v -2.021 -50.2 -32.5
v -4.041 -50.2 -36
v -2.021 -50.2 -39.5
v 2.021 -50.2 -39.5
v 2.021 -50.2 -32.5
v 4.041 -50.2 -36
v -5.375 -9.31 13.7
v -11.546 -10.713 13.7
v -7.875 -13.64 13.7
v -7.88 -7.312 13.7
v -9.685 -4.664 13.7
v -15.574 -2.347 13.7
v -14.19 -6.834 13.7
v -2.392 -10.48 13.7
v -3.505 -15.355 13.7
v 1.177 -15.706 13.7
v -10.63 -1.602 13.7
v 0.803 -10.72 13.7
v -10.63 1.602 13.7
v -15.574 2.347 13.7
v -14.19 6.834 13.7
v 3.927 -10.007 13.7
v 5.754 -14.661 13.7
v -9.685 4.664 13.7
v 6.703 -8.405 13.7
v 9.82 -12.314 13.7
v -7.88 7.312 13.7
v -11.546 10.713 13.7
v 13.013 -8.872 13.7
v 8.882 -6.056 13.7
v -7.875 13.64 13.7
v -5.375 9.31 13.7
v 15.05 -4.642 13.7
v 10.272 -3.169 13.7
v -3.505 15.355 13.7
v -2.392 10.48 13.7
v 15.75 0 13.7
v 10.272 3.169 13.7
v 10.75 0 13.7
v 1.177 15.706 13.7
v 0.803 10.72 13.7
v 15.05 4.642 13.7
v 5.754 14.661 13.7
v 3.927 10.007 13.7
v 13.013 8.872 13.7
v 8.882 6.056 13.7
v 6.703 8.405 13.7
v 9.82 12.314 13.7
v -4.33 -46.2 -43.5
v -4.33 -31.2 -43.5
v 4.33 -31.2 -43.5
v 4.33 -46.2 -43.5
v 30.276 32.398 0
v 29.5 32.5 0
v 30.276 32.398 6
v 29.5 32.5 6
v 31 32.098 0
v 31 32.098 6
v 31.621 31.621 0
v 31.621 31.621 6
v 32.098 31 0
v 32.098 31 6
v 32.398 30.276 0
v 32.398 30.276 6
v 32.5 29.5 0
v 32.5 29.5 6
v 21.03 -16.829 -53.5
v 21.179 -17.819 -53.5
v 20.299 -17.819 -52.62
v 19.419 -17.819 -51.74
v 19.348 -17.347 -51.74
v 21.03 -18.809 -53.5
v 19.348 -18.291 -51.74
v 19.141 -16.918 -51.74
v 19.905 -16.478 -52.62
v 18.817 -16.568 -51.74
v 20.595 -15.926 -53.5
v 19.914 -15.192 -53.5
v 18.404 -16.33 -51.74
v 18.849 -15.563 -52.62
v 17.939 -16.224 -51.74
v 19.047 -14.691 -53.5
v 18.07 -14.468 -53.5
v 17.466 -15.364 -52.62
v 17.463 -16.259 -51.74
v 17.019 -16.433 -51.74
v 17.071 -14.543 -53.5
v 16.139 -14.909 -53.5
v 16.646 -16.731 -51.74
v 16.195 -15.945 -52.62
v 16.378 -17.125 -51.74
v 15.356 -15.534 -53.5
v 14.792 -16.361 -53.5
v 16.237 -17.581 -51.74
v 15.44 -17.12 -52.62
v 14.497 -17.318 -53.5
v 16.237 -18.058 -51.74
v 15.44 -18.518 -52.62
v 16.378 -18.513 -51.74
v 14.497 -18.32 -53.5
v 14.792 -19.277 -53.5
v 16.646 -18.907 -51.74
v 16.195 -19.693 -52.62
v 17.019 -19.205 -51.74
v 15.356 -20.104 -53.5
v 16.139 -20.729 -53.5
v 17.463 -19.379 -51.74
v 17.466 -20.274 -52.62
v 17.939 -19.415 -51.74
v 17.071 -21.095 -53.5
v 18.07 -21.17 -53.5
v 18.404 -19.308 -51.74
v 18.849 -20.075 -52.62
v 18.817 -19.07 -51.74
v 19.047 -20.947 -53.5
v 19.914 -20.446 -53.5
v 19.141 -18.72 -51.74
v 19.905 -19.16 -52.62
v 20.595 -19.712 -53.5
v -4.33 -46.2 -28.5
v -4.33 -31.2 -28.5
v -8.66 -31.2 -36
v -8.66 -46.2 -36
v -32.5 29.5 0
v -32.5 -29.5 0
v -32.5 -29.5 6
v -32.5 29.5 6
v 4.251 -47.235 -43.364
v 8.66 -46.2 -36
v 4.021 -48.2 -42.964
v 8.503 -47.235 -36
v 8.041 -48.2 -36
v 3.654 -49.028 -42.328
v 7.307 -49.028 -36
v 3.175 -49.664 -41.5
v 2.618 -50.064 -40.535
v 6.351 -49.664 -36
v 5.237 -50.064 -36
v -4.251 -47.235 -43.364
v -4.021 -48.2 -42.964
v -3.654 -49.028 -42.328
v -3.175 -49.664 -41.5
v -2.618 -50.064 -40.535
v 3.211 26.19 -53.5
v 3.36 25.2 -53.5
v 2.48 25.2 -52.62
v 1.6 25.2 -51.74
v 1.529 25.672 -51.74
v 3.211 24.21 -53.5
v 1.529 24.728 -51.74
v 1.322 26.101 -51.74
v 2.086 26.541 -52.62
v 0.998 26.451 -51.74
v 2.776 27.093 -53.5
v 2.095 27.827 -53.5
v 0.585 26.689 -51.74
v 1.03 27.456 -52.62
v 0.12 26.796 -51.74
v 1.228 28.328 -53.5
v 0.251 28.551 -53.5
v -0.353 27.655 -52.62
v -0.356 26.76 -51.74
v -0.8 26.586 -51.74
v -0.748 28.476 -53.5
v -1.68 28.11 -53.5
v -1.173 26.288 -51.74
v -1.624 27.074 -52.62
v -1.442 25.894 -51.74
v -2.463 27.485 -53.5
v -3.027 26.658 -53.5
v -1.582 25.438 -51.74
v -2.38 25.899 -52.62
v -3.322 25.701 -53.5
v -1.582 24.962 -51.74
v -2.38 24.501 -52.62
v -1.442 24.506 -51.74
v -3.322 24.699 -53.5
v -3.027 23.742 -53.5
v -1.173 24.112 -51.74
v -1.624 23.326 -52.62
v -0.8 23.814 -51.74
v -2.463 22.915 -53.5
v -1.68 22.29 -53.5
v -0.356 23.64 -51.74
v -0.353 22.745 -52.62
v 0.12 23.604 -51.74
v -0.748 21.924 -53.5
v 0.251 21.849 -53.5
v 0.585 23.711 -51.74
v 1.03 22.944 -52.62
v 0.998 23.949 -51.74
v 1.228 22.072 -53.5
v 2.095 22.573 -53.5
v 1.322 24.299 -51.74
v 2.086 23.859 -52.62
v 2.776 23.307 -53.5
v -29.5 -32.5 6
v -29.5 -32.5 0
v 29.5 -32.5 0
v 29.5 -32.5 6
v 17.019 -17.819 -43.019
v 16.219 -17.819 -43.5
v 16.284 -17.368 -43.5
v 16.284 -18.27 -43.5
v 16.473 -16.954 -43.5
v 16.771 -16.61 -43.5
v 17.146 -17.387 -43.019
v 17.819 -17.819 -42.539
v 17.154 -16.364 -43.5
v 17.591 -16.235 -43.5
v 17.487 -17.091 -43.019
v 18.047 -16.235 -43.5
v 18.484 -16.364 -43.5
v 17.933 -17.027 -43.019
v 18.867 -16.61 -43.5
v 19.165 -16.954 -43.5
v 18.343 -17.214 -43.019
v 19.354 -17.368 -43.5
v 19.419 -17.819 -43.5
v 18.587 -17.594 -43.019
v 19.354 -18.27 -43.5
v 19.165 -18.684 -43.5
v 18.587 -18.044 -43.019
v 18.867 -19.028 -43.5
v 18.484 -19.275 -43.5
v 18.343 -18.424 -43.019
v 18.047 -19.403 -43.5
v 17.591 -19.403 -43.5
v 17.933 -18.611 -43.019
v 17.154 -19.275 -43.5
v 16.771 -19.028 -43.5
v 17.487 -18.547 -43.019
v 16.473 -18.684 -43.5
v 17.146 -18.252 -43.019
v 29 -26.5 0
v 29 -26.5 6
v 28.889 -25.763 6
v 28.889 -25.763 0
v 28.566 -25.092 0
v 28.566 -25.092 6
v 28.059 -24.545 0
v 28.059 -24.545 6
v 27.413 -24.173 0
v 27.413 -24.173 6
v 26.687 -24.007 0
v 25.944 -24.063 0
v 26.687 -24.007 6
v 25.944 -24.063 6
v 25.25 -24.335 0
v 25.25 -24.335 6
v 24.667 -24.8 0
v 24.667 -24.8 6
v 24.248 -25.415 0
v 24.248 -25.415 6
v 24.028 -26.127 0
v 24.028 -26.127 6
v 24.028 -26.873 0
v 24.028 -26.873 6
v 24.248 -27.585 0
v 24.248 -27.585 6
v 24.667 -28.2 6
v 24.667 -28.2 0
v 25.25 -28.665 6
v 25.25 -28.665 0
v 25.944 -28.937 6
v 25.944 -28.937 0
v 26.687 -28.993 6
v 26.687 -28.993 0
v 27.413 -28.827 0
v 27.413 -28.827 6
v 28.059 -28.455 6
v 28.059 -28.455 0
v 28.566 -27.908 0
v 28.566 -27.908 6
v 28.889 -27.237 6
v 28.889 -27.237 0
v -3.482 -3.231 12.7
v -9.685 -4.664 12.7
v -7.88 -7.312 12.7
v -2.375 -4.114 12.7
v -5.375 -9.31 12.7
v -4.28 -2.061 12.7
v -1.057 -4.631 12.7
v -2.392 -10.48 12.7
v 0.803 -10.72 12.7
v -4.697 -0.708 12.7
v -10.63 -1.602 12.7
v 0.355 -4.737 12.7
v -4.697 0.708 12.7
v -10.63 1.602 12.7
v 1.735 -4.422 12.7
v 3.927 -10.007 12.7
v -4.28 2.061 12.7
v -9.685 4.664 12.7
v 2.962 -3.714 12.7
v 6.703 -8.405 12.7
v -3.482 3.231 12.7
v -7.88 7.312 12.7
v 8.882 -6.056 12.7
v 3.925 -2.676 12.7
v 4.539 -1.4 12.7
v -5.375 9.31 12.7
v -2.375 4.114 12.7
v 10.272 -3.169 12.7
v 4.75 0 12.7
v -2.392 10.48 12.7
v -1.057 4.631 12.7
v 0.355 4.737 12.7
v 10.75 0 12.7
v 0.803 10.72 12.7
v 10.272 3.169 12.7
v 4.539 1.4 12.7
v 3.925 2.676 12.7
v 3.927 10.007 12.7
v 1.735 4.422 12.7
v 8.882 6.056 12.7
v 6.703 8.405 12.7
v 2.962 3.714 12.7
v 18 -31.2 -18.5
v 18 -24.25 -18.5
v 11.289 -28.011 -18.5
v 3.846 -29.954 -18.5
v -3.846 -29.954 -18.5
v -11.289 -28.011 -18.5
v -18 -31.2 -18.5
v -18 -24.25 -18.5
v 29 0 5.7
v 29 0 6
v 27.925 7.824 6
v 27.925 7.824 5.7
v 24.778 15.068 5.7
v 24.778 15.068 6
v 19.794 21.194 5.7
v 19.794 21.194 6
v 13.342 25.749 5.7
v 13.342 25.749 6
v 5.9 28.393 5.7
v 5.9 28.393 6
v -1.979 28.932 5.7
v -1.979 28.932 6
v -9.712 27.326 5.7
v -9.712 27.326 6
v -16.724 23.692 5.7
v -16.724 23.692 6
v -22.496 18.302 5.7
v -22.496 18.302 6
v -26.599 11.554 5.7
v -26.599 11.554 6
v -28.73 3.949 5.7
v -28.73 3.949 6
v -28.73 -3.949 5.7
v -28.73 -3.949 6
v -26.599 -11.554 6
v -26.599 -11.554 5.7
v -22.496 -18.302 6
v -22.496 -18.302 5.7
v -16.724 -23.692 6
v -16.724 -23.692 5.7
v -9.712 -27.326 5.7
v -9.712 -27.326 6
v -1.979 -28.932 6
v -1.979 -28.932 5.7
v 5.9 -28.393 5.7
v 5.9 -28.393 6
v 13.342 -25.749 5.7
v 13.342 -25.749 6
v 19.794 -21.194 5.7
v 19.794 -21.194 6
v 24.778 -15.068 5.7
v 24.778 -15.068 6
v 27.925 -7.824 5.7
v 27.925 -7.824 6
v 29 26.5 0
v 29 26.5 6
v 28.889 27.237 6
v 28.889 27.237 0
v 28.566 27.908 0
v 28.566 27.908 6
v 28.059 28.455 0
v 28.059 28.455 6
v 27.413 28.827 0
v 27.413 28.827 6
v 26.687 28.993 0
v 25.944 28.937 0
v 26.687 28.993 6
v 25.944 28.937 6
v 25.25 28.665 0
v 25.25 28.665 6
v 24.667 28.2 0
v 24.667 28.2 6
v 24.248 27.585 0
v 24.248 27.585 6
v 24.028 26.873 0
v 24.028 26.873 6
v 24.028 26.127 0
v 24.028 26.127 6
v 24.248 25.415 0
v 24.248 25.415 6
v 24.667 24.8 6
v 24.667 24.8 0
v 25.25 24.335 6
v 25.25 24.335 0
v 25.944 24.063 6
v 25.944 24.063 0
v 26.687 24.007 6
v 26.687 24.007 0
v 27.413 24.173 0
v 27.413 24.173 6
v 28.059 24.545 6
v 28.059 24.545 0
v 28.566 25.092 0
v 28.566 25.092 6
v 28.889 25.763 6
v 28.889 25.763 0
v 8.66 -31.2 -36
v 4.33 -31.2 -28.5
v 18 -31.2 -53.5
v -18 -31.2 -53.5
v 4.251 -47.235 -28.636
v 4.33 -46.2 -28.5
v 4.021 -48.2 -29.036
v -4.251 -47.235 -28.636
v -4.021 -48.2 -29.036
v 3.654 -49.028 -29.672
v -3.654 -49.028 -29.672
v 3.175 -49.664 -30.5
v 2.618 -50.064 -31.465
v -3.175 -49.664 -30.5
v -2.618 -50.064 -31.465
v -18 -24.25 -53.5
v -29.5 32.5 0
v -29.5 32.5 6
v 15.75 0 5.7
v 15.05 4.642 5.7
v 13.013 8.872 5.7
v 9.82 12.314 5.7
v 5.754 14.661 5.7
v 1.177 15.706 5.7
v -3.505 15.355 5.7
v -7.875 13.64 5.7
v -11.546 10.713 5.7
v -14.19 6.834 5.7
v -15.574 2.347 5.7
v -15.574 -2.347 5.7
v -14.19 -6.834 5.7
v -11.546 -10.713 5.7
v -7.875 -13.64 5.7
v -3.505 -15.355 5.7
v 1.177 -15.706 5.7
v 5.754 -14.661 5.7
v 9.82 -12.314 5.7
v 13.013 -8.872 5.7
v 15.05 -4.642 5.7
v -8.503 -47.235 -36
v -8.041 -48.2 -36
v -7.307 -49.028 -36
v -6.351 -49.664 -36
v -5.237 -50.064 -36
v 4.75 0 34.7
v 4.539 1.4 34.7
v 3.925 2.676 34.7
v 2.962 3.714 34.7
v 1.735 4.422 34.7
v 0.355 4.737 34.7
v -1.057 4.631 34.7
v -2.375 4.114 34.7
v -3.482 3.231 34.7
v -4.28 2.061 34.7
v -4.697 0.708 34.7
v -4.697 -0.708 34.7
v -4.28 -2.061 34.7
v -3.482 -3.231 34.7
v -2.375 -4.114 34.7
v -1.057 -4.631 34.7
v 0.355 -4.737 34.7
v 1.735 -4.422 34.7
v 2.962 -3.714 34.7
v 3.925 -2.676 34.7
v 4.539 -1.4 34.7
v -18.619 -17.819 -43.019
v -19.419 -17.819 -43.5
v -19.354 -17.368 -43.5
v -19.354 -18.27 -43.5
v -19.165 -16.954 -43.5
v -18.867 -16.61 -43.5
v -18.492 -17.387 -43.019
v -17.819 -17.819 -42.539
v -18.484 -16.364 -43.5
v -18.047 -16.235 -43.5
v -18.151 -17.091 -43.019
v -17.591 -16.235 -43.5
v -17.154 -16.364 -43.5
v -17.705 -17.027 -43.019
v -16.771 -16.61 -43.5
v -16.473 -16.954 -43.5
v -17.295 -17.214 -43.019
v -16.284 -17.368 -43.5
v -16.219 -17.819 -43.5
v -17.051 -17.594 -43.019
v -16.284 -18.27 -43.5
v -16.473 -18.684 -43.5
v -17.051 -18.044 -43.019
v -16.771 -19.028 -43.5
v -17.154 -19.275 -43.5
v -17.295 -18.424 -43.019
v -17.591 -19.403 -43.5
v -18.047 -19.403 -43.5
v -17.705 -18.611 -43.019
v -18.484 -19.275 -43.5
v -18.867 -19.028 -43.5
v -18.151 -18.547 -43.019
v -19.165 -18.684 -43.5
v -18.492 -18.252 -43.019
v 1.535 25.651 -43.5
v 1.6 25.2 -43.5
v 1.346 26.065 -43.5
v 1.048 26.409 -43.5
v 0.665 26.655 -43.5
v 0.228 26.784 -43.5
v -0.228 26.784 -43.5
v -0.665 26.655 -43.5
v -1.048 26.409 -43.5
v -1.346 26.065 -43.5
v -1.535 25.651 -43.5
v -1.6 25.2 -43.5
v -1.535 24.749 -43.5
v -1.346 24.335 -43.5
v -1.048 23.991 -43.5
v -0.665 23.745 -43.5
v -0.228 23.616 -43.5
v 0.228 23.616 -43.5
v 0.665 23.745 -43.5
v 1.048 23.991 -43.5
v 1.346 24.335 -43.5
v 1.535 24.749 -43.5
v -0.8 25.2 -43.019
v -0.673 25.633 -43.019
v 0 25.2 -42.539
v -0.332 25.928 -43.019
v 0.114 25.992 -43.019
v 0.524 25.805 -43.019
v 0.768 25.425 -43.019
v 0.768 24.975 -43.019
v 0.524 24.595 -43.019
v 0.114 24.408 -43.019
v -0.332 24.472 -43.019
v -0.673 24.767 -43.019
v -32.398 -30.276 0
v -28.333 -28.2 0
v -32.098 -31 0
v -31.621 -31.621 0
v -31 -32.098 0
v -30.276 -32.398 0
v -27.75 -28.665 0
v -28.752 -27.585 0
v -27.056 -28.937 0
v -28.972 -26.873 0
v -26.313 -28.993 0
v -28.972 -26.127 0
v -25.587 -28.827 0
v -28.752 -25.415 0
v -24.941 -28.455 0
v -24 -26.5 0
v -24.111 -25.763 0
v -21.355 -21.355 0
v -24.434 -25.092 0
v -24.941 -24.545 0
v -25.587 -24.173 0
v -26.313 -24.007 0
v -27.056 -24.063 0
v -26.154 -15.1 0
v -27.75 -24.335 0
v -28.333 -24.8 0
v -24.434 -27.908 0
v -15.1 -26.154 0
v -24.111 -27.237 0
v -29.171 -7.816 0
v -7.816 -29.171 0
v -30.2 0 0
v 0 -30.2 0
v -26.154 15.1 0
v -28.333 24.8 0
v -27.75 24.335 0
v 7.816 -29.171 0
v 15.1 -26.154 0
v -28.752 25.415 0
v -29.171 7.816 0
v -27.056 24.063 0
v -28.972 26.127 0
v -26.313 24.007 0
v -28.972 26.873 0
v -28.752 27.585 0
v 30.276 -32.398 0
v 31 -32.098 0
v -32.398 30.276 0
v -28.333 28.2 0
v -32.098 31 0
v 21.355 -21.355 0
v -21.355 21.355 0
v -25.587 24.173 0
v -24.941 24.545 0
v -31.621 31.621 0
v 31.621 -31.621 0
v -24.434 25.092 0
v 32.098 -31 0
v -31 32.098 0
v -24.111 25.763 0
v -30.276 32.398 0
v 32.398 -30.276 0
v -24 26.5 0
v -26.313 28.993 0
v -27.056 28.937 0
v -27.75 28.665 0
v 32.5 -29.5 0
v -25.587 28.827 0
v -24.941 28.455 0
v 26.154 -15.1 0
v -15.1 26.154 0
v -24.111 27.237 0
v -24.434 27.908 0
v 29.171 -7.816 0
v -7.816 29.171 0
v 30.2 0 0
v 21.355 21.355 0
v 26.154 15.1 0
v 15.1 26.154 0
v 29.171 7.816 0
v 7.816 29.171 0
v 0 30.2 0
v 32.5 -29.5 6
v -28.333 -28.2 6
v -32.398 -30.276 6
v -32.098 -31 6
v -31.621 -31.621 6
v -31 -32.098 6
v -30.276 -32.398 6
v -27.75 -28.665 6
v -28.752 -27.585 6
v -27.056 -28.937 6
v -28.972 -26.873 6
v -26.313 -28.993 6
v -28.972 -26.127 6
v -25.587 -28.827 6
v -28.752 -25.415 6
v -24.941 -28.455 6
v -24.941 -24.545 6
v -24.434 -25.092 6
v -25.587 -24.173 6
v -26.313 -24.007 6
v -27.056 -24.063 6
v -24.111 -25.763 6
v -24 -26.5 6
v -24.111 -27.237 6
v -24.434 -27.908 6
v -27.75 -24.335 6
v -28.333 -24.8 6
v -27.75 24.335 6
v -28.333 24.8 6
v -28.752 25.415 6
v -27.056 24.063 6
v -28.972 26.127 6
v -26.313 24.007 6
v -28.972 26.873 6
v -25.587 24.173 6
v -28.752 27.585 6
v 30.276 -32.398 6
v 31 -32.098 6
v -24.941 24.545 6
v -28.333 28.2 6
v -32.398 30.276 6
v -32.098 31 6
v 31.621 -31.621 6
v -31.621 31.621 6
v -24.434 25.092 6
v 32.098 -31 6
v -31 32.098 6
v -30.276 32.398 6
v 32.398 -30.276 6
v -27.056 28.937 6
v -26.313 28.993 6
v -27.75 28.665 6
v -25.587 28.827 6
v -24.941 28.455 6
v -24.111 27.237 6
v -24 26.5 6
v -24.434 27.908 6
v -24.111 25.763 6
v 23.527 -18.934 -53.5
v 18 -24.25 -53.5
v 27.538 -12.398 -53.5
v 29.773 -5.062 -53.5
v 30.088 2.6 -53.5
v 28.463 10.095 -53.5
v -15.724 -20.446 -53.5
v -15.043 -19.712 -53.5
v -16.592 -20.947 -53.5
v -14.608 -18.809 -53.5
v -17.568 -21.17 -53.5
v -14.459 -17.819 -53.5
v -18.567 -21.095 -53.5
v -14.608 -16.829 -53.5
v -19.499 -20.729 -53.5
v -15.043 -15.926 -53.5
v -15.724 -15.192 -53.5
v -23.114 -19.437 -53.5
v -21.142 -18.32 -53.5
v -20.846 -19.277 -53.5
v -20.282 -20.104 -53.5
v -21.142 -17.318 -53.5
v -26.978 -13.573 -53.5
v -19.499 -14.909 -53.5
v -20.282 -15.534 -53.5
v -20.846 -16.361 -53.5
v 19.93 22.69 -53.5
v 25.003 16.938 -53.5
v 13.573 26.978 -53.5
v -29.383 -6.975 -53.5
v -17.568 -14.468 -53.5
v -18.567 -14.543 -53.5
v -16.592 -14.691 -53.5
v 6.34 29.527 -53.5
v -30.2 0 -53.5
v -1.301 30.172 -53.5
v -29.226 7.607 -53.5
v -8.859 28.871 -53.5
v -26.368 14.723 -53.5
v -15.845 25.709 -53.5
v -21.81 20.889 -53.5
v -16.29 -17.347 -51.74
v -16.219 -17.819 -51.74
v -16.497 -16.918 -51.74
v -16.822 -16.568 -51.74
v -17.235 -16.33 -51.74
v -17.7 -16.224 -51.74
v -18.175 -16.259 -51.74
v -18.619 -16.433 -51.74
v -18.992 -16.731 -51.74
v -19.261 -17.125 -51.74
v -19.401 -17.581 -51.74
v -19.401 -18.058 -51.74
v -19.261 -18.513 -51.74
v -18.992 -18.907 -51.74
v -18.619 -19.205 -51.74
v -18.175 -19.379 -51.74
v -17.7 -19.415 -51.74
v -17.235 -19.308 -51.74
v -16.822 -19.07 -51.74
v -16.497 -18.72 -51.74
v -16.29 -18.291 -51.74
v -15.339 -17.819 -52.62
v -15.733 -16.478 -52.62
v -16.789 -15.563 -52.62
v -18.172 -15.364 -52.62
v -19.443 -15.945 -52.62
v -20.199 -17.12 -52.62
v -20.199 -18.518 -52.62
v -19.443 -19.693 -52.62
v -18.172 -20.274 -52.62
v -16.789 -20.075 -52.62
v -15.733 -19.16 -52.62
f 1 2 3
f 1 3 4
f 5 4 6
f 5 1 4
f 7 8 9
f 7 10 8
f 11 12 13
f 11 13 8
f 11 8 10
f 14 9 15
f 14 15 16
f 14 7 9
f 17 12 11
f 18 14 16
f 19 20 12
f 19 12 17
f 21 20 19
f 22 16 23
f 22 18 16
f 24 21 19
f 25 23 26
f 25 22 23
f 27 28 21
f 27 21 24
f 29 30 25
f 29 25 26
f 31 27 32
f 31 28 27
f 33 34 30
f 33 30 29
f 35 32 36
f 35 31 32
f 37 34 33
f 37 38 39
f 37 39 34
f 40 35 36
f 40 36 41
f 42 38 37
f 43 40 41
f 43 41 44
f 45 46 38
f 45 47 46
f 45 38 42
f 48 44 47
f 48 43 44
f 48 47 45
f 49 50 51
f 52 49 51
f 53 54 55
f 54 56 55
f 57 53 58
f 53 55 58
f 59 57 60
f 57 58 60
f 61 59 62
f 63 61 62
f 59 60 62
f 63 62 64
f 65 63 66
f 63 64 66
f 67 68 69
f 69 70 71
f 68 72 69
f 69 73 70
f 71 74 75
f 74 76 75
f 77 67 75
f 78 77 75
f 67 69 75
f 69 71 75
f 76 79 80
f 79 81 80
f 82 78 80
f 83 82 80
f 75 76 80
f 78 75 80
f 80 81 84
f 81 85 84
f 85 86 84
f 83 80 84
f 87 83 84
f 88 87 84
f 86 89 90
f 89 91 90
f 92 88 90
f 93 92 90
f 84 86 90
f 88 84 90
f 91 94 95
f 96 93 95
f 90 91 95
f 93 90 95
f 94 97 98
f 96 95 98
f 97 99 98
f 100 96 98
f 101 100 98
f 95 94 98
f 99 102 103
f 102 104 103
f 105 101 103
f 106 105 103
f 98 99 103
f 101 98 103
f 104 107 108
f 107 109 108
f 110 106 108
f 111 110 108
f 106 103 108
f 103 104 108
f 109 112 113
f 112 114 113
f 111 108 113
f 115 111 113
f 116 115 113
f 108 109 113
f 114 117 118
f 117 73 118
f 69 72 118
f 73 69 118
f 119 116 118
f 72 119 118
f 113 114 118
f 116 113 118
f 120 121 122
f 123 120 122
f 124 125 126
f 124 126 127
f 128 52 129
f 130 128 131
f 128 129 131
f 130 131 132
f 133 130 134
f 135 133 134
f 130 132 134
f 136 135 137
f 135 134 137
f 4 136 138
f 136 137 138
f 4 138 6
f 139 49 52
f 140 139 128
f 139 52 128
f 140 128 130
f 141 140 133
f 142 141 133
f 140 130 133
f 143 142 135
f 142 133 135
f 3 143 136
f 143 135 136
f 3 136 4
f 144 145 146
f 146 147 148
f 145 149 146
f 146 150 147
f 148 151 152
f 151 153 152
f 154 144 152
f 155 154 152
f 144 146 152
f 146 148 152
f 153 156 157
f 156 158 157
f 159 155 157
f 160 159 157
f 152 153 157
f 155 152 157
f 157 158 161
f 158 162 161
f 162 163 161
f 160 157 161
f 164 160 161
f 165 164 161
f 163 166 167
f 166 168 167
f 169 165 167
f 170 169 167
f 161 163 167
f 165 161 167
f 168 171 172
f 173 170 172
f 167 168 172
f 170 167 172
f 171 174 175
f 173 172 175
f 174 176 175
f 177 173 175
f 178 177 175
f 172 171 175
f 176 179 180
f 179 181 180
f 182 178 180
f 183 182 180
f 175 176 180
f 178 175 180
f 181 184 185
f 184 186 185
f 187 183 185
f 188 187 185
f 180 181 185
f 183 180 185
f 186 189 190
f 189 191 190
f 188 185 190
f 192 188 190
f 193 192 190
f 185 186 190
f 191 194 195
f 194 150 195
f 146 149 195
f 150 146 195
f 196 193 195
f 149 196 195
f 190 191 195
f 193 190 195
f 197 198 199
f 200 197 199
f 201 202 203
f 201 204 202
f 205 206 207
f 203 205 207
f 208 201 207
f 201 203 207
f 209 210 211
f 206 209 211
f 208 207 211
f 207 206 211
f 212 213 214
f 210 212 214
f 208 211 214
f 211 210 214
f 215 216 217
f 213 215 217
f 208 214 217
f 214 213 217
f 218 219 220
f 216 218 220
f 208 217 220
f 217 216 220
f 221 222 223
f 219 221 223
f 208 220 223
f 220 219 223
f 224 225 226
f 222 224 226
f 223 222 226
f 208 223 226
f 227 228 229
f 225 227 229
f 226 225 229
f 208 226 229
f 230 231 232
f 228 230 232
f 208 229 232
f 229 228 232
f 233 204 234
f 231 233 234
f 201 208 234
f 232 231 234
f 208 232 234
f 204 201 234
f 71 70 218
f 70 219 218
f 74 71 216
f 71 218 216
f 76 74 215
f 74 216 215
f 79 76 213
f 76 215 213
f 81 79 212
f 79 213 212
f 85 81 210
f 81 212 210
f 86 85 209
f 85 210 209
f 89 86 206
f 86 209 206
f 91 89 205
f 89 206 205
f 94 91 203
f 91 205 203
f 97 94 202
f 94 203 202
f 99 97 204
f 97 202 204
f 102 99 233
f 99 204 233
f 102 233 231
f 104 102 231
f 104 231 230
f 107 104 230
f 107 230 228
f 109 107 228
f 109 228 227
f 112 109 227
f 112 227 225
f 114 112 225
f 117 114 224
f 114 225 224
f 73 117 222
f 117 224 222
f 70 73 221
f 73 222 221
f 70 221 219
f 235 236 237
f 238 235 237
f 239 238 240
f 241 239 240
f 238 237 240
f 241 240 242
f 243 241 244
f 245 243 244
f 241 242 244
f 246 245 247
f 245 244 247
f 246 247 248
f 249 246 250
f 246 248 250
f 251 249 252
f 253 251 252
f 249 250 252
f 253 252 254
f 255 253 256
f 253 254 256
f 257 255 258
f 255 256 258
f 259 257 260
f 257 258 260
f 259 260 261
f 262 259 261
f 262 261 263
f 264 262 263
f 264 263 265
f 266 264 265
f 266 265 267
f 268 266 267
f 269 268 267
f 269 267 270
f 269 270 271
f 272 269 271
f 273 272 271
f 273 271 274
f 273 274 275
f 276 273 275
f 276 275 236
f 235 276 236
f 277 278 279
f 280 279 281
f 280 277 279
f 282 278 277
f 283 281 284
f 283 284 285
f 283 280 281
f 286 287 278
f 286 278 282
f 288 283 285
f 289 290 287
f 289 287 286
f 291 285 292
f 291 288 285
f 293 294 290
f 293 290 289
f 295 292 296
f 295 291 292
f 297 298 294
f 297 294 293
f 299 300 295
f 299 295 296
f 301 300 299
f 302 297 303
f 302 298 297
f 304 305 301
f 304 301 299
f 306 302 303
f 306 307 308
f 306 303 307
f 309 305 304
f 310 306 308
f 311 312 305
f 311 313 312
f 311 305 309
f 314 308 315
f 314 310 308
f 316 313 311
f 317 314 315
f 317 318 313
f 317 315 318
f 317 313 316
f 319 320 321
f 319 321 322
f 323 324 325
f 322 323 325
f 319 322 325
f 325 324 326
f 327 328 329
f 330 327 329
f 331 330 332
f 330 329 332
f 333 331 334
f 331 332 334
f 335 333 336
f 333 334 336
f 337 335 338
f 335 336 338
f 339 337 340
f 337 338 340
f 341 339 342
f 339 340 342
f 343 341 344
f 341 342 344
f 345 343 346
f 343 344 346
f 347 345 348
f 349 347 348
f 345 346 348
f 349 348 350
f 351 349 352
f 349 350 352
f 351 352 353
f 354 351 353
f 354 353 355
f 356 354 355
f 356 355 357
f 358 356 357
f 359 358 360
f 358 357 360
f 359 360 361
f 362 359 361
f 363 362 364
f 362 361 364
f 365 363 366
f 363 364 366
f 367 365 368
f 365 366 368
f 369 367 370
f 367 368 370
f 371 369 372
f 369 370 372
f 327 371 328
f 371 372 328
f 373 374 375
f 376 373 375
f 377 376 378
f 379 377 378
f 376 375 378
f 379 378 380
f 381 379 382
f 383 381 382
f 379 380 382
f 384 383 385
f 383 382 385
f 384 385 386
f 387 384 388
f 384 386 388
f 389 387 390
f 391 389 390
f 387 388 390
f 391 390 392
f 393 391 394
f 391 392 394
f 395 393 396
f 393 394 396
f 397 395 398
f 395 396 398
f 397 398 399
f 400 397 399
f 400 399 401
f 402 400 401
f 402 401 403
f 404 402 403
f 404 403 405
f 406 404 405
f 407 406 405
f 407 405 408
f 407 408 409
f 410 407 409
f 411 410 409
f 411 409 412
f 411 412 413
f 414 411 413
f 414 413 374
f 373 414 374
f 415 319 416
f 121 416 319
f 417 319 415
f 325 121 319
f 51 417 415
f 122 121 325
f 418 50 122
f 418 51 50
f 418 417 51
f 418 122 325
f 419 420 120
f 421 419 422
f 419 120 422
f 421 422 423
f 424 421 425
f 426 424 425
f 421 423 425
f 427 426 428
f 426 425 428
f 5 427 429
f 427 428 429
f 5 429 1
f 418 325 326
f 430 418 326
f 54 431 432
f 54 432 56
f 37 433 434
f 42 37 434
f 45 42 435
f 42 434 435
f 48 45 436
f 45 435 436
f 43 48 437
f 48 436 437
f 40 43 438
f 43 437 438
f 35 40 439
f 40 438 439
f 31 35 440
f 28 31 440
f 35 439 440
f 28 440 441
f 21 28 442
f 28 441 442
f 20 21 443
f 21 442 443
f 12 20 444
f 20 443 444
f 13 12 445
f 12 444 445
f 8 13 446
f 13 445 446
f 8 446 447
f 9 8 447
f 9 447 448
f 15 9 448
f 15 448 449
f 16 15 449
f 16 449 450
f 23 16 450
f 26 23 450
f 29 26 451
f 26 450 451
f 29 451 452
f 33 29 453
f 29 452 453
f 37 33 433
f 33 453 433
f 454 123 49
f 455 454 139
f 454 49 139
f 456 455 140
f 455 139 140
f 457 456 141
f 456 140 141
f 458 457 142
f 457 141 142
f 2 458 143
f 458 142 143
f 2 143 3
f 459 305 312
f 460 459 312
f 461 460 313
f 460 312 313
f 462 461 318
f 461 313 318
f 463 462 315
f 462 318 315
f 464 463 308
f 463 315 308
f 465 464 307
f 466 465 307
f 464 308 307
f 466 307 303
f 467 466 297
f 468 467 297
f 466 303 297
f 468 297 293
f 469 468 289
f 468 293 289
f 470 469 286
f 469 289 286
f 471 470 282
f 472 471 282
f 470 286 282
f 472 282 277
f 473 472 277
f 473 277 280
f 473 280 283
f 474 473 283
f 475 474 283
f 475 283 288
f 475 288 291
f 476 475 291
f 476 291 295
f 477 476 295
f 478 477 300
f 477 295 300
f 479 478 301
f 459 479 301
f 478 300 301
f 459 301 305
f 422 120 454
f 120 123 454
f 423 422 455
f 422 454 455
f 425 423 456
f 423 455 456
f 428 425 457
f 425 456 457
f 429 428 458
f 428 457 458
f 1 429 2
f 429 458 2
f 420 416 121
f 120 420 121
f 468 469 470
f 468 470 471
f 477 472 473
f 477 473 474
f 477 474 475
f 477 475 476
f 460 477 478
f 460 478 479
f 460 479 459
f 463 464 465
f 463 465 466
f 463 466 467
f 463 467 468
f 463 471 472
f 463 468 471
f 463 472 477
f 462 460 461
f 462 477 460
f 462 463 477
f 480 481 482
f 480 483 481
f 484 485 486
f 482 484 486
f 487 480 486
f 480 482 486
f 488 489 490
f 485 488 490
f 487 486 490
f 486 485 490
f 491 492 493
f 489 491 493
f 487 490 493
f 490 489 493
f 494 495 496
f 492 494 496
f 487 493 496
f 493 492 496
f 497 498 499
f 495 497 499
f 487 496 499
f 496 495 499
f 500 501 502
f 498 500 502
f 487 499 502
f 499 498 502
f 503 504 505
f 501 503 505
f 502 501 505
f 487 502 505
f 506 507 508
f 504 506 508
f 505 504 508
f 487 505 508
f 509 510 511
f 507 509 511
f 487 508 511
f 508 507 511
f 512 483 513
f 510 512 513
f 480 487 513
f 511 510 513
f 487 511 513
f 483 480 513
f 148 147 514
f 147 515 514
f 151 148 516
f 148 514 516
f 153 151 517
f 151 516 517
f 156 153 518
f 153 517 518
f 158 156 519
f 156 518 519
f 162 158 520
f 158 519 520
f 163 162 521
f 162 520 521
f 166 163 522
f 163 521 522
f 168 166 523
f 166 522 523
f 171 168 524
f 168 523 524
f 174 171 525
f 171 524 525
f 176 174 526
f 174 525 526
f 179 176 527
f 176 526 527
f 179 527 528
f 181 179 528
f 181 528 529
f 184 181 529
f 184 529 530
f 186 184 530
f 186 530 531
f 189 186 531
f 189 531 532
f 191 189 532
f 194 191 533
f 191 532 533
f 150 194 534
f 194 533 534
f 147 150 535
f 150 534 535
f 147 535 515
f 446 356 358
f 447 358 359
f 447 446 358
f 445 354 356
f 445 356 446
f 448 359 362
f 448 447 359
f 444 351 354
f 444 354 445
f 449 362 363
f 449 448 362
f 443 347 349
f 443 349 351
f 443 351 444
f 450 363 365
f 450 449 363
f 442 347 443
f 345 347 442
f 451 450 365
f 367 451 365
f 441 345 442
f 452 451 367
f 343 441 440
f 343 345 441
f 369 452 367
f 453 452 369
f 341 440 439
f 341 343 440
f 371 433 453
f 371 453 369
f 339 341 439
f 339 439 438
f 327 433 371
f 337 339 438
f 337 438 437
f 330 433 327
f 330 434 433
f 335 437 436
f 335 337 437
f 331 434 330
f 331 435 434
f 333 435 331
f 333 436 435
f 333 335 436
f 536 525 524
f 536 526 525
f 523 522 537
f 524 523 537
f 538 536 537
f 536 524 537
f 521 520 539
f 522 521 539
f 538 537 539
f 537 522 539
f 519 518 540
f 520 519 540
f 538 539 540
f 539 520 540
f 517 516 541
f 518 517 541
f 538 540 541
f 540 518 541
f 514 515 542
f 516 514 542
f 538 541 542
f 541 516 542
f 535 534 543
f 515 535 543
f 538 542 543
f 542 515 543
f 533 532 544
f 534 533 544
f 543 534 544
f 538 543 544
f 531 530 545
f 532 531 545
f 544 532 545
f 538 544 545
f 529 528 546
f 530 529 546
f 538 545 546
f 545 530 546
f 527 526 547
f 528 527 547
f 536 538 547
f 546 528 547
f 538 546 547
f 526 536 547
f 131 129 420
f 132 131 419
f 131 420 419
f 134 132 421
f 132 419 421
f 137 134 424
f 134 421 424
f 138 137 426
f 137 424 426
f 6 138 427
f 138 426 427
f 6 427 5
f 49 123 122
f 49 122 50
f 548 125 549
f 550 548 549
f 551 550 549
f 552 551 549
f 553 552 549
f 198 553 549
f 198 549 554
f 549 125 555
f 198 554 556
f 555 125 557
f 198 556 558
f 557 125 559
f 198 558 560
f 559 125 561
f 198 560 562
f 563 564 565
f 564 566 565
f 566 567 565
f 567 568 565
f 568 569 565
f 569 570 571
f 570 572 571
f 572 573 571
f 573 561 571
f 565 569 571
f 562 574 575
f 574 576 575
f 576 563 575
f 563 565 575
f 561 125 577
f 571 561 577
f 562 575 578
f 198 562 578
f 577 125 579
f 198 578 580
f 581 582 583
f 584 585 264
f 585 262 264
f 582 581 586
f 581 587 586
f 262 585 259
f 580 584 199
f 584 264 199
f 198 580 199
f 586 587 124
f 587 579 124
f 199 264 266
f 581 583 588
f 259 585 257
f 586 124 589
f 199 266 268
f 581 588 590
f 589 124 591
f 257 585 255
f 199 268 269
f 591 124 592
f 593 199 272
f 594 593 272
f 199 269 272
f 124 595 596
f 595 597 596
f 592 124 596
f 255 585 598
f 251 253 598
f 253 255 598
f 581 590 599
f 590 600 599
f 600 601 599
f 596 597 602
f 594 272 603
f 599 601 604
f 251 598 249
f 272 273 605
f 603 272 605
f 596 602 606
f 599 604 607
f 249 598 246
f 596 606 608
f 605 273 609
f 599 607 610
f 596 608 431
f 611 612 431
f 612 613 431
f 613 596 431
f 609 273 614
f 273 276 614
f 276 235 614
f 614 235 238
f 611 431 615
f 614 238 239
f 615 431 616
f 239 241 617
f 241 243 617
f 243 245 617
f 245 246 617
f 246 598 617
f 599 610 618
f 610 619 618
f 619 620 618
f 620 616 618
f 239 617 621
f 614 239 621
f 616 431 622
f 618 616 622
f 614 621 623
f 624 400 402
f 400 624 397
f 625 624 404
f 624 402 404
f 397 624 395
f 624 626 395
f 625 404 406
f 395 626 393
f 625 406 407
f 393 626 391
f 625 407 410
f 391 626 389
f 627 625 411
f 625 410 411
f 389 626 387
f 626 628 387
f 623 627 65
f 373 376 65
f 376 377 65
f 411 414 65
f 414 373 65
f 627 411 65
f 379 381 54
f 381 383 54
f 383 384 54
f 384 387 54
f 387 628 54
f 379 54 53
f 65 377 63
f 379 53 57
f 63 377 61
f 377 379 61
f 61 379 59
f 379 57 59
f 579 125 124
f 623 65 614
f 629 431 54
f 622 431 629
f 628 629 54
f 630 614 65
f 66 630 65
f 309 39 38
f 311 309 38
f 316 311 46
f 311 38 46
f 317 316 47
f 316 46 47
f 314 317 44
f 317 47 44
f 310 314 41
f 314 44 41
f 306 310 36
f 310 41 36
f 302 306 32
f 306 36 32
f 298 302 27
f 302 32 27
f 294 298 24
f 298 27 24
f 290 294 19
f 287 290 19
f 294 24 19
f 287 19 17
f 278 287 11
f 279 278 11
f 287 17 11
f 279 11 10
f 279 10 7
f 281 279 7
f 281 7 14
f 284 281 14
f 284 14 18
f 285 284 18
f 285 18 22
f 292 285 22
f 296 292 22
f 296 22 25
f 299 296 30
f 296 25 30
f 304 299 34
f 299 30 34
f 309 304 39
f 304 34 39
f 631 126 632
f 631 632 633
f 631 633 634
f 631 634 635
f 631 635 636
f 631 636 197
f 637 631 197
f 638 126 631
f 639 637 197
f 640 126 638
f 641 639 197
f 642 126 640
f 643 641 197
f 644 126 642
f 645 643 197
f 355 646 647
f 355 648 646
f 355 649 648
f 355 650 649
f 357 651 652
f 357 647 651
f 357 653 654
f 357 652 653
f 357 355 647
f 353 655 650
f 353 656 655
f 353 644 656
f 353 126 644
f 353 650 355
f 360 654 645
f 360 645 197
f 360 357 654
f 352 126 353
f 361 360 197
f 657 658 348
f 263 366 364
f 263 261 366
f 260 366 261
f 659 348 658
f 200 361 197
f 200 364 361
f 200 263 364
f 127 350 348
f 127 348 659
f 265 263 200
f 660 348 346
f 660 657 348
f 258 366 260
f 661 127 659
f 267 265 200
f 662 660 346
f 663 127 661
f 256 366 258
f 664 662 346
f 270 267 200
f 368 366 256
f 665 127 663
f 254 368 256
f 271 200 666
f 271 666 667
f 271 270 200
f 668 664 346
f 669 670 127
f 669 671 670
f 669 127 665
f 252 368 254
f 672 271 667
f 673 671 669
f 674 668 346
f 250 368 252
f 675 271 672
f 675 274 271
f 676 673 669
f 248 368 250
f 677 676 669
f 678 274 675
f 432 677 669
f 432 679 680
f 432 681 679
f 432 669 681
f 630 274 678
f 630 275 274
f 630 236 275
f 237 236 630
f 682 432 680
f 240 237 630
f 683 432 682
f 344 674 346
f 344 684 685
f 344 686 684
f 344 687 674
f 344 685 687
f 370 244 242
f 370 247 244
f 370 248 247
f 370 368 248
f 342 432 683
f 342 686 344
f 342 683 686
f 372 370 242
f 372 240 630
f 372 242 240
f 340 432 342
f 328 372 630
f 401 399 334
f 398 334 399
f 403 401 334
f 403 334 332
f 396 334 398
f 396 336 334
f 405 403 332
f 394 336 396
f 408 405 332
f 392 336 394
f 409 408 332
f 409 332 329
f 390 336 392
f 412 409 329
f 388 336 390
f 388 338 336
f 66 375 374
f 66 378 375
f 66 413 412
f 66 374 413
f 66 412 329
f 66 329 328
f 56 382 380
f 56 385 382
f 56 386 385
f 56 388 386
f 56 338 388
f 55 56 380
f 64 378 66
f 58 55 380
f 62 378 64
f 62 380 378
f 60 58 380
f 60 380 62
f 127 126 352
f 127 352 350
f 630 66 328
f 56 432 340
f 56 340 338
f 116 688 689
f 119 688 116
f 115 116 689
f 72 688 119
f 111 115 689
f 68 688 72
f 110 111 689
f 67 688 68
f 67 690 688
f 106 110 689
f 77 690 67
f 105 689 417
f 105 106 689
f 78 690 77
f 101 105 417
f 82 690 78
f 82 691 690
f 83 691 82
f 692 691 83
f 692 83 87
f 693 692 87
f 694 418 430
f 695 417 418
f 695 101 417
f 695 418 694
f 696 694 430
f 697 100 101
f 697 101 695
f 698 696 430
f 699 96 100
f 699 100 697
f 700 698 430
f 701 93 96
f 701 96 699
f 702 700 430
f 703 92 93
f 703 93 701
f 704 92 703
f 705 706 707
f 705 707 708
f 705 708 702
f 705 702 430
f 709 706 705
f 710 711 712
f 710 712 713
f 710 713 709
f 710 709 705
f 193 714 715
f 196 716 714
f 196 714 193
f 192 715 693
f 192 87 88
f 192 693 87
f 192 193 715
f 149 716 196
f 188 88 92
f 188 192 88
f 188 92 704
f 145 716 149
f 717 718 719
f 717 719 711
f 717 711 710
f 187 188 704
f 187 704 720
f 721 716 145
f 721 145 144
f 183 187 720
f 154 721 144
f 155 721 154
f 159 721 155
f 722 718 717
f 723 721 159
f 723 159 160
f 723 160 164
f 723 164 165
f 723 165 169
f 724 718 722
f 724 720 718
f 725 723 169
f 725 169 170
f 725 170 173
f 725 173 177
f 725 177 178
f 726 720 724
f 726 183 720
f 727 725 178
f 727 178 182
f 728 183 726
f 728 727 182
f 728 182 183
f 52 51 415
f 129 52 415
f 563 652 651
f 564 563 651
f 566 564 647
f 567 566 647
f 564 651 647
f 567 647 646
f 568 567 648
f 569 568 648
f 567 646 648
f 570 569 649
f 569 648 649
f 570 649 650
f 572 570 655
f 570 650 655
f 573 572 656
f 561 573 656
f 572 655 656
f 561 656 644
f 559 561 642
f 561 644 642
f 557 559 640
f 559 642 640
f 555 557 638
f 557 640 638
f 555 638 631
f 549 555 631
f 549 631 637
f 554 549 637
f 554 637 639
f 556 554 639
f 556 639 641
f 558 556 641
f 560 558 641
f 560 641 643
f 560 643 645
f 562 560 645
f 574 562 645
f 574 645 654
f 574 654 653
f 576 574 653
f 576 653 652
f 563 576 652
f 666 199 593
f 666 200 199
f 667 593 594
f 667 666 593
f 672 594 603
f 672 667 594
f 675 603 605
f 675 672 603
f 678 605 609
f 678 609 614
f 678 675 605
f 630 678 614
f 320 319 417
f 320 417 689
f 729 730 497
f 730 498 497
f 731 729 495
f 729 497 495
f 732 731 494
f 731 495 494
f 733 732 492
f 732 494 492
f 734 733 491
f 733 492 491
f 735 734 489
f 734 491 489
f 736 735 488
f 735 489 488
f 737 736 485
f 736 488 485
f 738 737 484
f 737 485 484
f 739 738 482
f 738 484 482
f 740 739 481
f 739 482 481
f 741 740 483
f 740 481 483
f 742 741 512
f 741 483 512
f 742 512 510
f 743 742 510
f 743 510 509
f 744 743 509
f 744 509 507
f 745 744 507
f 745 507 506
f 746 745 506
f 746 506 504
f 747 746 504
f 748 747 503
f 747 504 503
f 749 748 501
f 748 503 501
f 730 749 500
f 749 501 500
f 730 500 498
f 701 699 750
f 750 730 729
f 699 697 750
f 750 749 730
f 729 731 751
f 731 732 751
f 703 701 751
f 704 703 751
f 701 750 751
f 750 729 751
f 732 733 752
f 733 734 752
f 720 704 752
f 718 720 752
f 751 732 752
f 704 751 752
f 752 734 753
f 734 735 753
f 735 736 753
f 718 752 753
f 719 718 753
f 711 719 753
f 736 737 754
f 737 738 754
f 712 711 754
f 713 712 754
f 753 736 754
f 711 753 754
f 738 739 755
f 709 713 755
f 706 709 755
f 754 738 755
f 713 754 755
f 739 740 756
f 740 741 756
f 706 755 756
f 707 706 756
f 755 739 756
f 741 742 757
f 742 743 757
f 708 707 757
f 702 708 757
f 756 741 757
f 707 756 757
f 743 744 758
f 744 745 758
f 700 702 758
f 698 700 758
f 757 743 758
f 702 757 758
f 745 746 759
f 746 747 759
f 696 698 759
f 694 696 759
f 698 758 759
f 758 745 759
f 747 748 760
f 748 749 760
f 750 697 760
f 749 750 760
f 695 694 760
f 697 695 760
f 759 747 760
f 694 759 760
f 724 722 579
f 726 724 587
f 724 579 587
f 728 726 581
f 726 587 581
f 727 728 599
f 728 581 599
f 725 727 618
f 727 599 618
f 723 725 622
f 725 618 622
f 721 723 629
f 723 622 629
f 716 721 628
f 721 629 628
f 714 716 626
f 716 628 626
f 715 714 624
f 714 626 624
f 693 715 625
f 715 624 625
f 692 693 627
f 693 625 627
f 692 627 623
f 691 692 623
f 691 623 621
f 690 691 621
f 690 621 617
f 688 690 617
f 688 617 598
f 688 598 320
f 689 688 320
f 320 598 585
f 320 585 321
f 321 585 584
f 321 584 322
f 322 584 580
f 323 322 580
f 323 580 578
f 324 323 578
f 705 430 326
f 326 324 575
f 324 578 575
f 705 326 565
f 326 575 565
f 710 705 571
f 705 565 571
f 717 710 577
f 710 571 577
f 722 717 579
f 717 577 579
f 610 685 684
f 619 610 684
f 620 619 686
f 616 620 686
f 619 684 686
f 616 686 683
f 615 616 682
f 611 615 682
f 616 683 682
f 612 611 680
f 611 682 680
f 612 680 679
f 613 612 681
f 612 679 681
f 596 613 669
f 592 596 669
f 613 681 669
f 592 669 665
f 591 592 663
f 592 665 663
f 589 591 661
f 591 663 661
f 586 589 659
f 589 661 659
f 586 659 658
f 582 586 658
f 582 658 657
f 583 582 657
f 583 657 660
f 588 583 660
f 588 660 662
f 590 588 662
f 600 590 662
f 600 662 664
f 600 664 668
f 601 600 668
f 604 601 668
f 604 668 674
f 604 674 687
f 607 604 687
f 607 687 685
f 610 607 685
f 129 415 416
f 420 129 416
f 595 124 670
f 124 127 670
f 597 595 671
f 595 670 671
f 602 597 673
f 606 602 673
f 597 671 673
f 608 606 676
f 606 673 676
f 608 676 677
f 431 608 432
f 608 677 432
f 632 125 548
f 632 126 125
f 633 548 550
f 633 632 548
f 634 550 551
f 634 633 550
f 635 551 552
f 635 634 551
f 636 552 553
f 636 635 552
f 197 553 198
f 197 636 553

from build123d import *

# Parameters (mm, degrees)
IZIM1_W                        = 65
IZIM1_H                        = 65
Y_KSEKLIK_EKSTR_ZYON1_DEPTH    = 6
IZIM2_R                        = 30.2
Y_KSEKLIK_EKSTR_ZYON2_DEPTH    = 53.5
IZIM3_W                        = 36
IZIM3_H                        = 6.950463922
Y_KSEKLIK_EKSTR_ZYON3_DEPTH    = 35
IZIM5_R                        = 1.5
KES_EKSTR_ZYON2_DEPTH          = 10
Y_KSEKLIK_EKSTR_ZYON7_START    = 10
IZIM31_R                       = 1.5
Y_KSEKLIK_EKSTR_ZYON7_DEPTH    = 10
M3_SFHCS_IN_HAV_A5_D           = 3.2
M3_SFHCS_IN_HAV_A5_DEPTH       = 10
M3_SFHCS_IN_HAV_A5_CSINK_D     = 6.72
M3_SFHCS_IN_HAV_A5_CSINK_ANGLE = 90
M3_SFHCS_IN_HAV_A5_TIP         = 0.96137699
Y_KSEKLIK_EKSTR_ZYON8_DEPTH    = 19
RADYUS1_R                      = 4
IZIM35_R                       = 29
KES_EKSTR_ZYON3_DEPTH          = 0.3
IZIM36_R                       = 15.75
Y_KSEKLIK_EKSTR_ZYON9_DEPTH    = 8
IZIM37_R                       = 10.75
KES_EKSTR_ZYON4_DEPTH          = 1
IZIM38_R                       = 4.75
Y_KSEKLIK_EKSTR_ZYON10_DEPTH   = 22
IZIM39_R                       = 2.5
KES_EKSTR_ZYON5_DEPTH          = 10
RADYUS2_R                      = 3


with BuildPart() as part:
    # Çizim1 → Yükseklik-Ekstrüzyon1 (new body)
    with BuildSketch(Plane.XY):
        Rectangle(IZIM1_W, IZIM1_H)
    extrude(amount=Y_KSEKLIK_EKSTR_ZYON1_DEPTH)

    # Çizim2 → Yükseklik-Ekstrüzyon2 (add)
    with BuildSketch(Plane(origin=(0, 0, 0), x_dir=(-1, 0, 0), z_dir=(0, 0, -1))):
        Circle(IZIM2_R)
    extrude(amount=Y_KSEKLIK_EKSTR_ZYON2_DEPTH)

    # Çizim3 → Yükseklik-Ekstrüzyon3 (add)
    with BuildSketch(Plane(origin=(0, 0, -53.5), x_dir=(-1, 0, 0), z_dir=(0, 0, -1))):
        with Locations((0, -27.724768039)):
            Rectangle(IZIM3_W, IZIM3_H)
    extrude(amount=-Y_KSEKLIK_EKSTR_ZYON3_DEPTH)

    # Çizim5 → Kes-Ekstrüzyon2 (cut)
    with BuildSketch(Plane(origin=(0, 0, -53.5), x_dir=(-1, 0, 0), z_dir=(0, 0, -1))):
        with Locations((0, 25.2)):
            Circle(IZIM5_R)
        with Locations((-17.819090886, -17.819090886)):
            Circle(IZIM5_R)
        with Locations((17.819090886, -17.819090886)):
            Circle(IZIM5_R)
    extrude(amount=-KES_EKSTR_ZYON2_DEPTH, mode=Mode.SUBTRACT)

    # Çizim31 → Yükseklik-Ekstrüzyon7 (add)
    with BuildSketch(Plane(origin=(0, 0, -43.5), x_dir=(-1, 0, 0), z_dir=(0, 0, -1)).offset(Y_KSEKLIK_EKSTR_ZYON7_START)):
        with Locations((0, 25.2)):
            Circle(IZIM31_R)
        with Locations((17.819090886, -17.819090886)):
            Circle(IZIM31_R)
        with Locations((-17.819090886, -17.819090886)):
            Circle(IZIM31_R)
    extrude(amount=-Y_KSEKLIK_EKSTR_ZYON7_DEPTH)

    # M3 SFHCS İçin Havşa5
    with Locations(Plane(origin=(0, 0, -53.5), x_dir=(-1, 0, 0), z_dir=(0, 0, -1))):
        with Locations((0, 25.2), (-17.819090886, -17.819090886), (17.819090886, -17.819090886)):
            CounterSinkHole(M3_SFHCS_IN_HAV_A5_D / 2, M3_SFHCS_IN_HAV_A5_CSINK_D / 2, depth=M3_SFHCS_IN_HAV_A5_DEPTH, counter_sink_angle=M3_SFHCS_IN_HAV_A5_CSINK_ANGLE)
            with Locations((0, 0, -(M3_SFHCS_IN_HAV_A5_DEPTH + M3_SFHCS_IN_HAV_A5_TIP / 2))):  # 118° drill point
                Cone(0, M3_SFHCS_IN_HAV_A5_D / 2, M3_SFHCS_IN_HAV_A5_TIP, mode=Mode.SUBTRACT)

    # Çizim34 → Yükseklik-Ekstrüzyon8 (add)
    with BuildSketch(Plane.XZ.offset(31.2)):
        Polygon((-8.660254038, -36), (-4.330127019, -43.5), (4.330127019, -43.5), (8.660254038, -36), (4.330127019, -28.5), (-4.330127019, -28.5), align=None)
    extrude(amount=Y_KSEKLIK_EKSTR_ZYON8_DEPTH)

    # Radyus1
    radyus1_edges = [part.edges().sort_by_distance(p)[0] for p in [
        (-6.495190528, -50.2, -32.25),
        (-6.495190528, -50.2, -39.75),
        (0, -50.2, -43.5),
        (6.495190528, -50.2, -39.75),
        (6.495190528, -50.2, -32.25),
        (0, -50.2, -28.5),
    ]]
    fillet(radyus1_edges, radius=RADYUS1_R)

    # Çizim35 → Kes-Ekstrüzyon3 (cut)
    with BuildSketch(Plane.XY.offset(6)):
        Circle(IZIM35_R)
    extrude(amount=-KES_EKSTR_ZYON3_DEPTH, mode=Mode.SUBTRACT)

    # Çizim36 → Yükseklik-Ekstrüzyon9 (add)
    with BuildSketch(Plane.XY.offset(5.7)):
        Circle(IZIM36_R)
    extrude(amount=Y_KSEKLIK_EKSTR_ZYON9_DEPTH)

    # Çizim37 → Kes-Ekstrüzyon4 (cut)
    with BuildSketch(Plane.XY.offset(13.7)):
        Circle(IZIM37_R)
    extrude(amount=-KES_EKSTR_ZYON4_DEPTH, mode=Mode.SUBTRACT)

    # Çizim38 → Yükseklik-Ekstrüzyon10 (add)
    with BuildSketch(Plane.XY.offset(12.7)):
        Circle(IZIM38_R)
    extrude(amount=Y_KSEKLIK_EKSTR_ZYON10_DEPTH)

    # Çizim39 → Kes-Ekstrüzyon5 (cut)
    with BuildSketch(Plane.XY.offset(6)):
        with Locations((26.5, -26.5)):
            Circle(IZIM39_R)
        with Locations((-26.5, -26.5)):
            Circle(IZIM39_R)
        with Locations((-26.5, 26.5)):
            Circle(IZIM39_R)
        with Locations((26.5, 26.5)):
            Circle(IZIM39_R)
    extrude(amount=-KES_EKSTR_ZYON5_DEPTH, mode=Mode.SUBTRACT)

    # Radyus2
    radyus2_edges = [part.edges().sort_by_distance(p)[0] for p in [
        (-32.5, 32.5, 3),
        (32.5, 32.5, 3),
        (32.5, -32.5, 3),
        (-32.5, -32.5, 3),
    ]]
    fillet(radyus2_edges, radius=RADYUS2_R)


solid = part.part
